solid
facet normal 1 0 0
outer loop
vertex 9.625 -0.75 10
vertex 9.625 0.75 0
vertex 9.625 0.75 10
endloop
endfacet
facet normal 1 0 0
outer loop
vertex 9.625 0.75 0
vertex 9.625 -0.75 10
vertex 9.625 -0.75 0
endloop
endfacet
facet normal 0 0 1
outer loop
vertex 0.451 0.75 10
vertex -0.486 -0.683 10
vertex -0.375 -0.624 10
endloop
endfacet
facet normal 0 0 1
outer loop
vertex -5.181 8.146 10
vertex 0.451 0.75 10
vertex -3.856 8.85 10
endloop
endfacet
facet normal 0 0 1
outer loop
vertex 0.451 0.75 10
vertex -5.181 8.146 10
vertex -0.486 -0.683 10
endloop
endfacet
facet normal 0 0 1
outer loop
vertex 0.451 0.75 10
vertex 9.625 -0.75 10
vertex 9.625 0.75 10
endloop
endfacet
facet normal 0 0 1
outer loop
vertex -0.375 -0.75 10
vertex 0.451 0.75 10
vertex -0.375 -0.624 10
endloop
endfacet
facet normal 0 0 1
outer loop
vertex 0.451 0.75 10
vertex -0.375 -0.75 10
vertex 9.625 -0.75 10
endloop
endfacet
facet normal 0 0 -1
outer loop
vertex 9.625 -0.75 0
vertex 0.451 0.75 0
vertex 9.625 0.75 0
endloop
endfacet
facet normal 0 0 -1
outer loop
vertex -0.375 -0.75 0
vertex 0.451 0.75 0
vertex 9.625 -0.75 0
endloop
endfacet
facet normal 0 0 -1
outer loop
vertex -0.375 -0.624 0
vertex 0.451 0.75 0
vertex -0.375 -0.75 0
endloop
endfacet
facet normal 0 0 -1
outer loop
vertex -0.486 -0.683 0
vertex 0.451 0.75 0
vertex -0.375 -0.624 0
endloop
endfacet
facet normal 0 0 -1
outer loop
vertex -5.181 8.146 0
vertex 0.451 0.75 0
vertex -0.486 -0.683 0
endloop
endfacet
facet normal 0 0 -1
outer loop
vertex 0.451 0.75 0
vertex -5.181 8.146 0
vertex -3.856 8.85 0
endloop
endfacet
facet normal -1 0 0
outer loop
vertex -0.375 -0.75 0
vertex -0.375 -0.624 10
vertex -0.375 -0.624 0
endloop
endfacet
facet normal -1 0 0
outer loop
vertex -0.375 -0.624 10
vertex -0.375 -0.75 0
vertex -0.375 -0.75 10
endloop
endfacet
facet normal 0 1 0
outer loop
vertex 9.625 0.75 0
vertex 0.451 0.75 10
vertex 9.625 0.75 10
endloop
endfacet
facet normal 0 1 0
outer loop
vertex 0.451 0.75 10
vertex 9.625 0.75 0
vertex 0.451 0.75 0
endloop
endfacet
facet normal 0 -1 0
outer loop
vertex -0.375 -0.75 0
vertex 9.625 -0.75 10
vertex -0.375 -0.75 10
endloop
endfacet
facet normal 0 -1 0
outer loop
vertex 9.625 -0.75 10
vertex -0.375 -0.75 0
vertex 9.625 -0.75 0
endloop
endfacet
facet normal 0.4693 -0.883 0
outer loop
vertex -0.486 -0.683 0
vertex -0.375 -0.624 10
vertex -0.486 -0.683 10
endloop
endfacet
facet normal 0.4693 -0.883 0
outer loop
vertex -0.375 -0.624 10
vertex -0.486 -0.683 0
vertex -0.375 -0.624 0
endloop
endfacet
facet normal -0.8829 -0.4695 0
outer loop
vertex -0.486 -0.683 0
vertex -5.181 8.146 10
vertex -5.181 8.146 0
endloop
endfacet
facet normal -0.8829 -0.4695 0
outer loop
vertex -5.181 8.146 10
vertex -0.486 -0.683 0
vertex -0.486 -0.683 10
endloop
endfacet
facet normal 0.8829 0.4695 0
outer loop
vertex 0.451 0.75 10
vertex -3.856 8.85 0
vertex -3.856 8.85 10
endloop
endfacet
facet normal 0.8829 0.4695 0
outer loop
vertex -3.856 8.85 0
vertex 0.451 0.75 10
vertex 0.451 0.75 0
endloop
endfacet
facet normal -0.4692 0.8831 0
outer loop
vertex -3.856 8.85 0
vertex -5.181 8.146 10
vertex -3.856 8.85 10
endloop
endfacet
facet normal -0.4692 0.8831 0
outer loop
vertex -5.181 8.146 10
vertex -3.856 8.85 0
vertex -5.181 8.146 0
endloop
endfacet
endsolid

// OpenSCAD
t=1.5;
//23?

translate([-t/4,-t/2,0]) cube([10,t,10]);
rotate([0,0,118]) translate([-t/4,-t/2,0]) cube([10,t,10]);
